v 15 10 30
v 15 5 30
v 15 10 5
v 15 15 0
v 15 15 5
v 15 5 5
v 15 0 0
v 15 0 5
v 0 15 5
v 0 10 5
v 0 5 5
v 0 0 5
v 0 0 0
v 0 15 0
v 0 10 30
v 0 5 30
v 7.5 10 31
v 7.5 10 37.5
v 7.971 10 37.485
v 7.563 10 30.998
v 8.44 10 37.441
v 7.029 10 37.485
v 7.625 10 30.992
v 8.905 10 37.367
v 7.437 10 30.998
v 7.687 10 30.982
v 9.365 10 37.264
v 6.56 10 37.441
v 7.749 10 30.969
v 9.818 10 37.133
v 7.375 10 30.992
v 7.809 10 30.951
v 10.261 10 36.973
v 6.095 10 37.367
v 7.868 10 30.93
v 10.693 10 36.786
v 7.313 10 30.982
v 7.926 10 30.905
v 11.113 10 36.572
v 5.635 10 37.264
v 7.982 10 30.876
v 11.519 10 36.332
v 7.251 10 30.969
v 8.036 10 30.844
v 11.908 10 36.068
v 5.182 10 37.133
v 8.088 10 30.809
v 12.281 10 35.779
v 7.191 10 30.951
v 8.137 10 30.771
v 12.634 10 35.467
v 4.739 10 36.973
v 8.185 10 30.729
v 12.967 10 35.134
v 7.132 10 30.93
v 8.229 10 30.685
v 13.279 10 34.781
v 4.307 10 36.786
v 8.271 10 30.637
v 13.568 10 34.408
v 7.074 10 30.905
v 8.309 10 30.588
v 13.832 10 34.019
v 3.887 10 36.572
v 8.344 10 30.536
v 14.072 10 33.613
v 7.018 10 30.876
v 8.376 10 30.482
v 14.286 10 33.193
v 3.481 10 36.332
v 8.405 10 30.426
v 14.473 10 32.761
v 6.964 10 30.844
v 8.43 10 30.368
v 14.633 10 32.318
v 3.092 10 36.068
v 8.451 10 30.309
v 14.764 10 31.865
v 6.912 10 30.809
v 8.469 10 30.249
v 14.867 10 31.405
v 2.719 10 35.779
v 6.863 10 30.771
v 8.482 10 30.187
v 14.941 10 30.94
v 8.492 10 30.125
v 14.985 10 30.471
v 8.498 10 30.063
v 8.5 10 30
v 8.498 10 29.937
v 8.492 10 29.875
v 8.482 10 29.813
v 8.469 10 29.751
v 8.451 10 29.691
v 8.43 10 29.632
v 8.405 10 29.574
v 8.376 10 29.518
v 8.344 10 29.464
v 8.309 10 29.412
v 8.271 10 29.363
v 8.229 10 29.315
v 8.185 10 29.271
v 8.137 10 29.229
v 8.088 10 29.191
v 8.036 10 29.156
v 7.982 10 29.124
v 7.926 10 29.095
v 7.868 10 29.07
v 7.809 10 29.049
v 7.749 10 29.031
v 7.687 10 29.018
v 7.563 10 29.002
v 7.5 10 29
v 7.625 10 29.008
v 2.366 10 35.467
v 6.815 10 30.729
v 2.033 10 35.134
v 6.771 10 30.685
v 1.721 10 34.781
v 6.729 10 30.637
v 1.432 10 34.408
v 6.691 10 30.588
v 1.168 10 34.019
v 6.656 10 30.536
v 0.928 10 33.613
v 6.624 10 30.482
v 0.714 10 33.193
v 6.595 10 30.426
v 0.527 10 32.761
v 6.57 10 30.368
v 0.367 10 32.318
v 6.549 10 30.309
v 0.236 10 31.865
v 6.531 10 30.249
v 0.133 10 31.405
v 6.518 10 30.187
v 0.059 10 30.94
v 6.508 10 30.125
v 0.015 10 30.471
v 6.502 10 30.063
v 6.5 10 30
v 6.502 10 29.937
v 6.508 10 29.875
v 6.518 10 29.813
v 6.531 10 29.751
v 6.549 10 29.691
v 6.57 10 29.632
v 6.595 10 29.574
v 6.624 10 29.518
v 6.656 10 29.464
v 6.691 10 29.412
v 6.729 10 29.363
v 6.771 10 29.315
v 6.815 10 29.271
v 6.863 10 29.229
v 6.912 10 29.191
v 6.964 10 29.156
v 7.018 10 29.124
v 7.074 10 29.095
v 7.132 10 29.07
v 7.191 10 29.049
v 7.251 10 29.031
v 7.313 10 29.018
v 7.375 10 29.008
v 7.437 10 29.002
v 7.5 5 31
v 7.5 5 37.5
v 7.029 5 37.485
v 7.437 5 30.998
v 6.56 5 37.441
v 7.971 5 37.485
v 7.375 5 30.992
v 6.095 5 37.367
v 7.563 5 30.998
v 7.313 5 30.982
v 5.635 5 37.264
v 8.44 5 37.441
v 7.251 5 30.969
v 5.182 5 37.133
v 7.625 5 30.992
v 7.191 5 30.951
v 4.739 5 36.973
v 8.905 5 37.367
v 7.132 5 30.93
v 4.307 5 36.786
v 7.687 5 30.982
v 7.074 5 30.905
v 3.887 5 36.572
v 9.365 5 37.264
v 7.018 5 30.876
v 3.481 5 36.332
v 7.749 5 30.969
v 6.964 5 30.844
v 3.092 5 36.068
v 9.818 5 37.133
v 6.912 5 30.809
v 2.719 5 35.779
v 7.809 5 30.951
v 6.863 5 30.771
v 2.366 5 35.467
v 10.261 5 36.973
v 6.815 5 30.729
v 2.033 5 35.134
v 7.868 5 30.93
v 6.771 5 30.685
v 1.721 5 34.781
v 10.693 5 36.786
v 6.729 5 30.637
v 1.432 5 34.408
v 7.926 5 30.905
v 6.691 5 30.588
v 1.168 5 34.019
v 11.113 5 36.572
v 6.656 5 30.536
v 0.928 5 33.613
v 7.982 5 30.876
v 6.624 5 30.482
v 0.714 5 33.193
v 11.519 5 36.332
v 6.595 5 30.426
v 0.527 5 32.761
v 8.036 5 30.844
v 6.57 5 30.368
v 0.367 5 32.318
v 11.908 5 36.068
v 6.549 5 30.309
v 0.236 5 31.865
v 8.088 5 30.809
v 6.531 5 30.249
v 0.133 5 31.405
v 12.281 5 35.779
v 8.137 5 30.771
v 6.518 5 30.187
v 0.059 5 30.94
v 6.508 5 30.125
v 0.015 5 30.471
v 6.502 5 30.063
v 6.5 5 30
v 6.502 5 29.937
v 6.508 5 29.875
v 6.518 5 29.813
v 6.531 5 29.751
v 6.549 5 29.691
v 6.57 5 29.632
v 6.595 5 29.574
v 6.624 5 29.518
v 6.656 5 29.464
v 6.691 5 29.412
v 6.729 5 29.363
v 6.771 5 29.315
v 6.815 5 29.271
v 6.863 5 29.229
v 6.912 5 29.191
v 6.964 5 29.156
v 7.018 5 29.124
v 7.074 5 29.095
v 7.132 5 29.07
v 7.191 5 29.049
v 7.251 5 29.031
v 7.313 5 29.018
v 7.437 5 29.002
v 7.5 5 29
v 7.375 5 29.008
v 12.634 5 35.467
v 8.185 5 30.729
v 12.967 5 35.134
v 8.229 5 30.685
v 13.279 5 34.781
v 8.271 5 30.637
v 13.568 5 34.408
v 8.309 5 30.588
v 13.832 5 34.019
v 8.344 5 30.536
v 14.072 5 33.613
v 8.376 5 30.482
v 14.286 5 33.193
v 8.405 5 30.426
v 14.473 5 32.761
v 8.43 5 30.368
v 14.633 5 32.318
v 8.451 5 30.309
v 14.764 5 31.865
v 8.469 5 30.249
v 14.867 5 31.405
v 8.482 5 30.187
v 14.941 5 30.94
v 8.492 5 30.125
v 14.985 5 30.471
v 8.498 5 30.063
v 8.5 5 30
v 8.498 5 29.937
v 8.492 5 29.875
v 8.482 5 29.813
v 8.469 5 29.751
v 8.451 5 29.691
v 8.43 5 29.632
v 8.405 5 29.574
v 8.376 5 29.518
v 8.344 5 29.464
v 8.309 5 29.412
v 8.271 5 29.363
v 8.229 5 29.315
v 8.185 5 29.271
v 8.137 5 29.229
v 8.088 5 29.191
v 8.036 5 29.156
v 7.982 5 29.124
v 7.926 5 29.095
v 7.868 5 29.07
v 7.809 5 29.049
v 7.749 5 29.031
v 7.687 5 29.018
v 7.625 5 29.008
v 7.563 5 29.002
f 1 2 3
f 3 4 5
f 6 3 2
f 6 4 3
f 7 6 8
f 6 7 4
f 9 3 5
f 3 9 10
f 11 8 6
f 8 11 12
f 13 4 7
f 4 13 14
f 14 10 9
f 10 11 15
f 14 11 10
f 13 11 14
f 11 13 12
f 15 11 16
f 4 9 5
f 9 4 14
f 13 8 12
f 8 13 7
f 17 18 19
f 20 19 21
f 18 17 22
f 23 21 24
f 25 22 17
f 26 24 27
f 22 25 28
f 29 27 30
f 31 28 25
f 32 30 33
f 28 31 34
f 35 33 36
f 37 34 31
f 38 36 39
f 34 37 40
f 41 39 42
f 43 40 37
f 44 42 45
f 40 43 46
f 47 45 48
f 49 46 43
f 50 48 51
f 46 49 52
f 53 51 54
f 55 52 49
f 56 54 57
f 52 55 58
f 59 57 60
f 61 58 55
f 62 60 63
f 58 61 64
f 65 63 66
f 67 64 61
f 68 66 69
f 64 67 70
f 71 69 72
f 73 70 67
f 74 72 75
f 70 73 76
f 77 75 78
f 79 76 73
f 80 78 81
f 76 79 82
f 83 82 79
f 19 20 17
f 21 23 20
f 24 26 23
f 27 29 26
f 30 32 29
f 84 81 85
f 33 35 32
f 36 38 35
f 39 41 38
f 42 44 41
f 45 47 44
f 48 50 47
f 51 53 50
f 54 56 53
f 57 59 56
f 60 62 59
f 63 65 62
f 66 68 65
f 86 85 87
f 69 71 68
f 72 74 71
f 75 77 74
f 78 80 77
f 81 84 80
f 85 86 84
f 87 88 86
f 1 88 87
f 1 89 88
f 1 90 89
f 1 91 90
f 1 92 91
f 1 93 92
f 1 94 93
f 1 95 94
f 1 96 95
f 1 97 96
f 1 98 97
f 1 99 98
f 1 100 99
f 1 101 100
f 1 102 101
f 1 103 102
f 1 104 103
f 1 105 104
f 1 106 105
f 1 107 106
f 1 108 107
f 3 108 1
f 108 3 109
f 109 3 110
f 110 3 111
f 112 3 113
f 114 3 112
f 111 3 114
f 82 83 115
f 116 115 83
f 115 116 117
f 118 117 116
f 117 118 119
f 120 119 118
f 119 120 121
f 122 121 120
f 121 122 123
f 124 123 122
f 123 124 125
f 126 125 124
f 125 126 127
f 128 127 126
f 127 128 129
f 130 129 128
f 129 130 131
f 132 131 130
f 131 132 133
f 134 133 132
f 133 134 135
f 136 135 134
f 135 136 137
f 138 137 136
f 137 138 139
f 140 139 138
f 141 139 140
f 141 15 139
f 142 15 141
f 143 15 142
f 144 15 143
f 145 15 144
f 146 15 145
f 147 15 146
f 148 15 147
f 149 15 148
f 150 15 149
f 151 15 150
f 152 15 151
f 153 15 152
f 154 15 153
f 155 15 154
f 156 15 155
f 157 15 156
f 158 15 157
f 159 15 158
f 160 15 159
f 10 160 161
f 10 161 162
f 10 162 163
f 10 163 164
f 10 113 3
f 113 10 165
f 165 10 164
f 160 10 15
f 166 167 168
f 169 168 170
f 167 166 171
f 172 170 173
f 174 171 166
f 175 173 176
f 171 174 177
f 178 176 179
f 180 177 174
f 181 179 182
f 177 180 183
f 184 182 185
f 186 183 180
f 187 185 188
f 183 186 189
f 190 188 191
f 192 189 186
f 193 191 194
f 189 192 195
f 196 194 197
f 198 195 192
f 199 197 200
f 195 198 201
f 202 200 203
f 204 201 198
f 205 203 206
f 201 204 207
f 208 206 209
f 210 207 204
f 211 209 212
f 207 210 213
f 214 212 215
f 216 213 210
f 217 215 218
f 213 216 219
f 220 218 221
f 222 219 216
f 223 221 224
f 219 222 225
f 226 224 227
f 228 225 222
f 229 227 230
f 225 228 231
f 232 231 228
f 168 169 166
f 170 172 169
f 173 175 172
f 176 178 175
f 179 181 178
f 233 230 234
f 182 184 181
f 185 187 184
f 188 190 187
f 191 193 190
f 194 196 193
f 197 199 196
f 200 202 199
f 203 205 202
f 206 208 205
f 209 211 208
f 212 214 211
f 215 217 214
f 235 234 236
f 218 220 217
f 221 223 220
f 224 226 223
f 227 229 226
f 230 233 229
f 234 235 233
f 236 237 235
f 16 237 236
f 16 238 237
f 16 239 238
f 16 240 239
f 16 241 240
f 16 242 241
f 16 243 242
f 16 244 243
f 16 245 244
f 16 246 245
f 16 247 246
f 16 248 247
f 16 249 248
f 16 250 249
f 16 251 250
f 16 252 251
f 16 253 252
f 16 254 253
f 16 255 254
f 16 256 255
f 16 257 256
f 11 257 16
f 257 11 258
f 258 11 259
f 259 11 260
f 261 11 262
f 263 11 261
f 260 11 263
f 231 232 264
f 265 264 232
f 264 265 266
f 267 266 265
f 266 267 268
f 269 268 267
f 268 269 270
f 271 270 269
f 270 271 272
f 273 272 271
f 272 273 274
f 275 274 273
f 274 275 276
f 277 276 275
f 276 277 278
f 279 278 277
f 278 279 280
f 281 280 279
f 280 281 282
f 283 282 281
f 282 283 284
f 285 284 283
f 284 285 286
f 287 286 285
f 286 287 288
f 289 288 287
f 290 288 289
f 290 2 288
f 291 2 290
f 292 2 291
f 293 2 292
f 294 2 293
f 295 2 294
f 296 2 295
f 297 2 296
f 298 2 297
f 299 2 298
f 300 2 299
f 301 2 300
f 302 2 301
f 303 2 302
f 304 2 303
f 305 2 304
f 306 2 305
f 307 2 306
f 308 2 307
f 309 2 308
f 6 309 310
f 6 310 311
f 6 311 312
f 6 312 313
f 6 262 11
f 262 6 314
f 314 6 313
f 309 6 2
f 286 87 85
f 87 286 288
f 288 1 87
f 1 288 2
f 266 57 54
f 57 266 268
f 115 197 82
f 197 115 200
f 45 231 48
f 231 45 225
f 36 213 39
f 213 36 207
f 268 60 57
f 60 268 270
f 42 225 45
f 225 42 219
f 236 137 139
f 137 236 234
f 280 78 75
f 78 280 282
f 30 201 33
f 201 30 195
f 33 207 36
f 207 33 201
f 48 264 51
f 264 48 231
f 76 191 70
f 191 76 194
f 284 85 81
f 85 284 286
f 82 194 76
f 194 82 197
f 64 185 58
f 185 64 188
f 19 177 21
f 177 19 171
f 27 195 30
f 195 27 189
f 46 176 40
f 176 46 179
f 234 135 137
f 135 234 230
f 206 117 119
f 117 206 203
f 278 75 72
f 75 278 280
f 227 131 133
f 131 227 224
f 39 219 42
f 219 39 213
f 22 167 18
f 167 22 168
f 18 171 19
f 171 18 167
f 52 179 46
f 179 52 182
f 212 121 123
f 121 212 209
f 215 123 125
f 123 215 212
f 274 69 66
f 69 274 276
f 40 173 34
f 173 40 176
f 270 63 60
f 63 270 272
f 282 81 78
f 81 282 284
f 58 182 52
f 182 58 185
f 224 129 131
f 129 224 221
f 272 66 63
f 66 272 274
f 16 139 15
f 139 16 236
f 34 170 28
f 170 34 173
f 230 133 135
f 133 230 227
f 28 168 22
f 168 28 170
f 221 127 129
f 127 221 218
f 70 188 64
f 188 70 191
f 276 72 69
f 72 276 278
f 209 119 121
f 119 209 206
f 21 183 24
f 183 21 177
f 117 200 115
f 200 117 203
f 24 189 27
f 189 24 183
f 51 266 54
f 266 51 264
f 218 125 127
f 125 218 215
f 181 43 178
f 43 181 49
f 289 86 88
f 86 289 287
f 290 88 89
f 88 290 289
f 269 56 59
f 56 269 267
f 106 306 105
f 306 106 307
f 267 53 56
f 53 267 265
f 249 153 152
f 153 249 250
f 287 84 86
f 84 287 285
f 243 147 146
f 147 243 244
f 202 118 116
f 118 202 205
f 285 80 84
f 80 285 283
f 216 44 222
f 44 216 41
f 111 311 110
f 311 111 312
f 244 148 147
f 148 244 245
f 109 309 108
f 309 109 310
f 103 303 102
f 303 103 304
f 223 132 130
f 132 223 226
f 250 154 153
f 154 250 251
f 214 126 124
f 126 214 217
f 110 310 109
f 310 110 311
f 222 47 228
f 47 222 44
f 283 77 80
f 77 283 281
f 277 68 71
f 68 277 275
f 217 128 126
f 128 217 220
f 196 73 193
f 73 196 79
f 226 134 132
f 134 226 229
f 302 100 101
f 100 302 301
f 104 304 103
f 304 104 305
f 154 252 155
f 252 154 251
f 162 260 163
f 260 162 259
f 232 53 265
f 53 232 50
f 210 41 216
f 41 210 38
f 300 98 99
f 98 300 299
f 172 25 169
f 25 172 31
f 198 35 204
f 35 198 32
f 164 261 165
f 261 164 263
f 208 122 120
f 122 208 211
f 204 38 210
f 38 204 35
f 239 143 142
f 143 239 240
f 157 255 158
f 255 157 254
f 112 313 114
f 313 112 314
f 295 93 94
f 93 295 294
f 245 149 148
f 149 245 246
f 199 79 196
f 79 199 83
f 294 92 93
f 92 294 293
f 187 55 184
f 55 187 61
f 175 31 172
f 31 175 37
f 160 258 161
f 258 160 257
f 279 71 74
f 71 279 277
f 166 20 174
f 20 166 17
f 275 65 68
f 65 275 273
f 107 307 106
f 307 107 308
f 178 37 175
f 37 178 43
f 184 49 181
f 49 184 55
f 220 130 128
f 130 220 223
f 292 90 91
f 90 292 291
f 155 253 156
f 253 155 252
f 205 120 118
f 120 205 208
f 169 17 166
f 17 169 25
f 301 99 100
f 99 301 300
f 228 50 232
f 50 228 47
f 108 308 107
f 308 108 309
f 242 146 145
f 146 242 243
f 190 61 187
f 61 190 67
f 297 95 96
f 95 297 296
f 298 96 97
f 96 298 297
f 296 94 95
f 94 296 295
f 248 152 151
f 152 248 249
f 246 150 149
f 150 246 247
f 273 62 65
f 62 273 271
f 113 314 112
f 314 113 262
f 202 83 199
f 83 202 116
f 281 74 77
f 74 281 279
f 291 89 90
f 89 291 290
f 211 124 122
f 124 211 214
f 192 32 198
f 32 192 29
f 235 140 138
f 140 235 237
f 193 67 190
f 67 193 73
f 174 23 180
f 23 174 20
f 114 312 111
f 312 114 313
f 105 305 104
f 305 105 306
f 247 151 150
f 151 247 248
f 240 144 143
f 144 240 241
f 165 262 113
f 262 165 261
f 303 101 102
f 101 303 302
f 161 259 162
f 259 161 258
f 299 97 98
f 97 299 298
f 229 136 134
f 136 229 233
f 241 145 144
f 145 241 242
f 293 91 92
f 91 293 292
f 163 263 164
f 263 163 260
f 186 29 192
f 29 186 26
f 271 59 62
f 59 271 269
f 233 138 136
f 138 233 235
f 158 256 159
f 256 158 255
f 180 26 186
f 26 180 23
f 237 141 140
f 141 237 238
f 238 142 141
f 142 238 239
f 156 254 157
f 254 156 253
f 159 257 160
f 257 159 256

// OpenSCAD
difference(){
	union(){ 

        translate([0,0,0]){
           cube([15,15,5], center=false);
        }
        translate([0,5,0]){
           cube([15,5,30], center=false);
        }
        translate([7.5,10,30]){
            rotate([90,0,0]){
                cylinder(h=5, r=7.5, $fn=100, center=false);
            }
        }
	}
	union() {
        translate([7.5,15,30]){
            rotate([90,0,0]){
                cylinder(h=20, r=1, $fn=100, center=false);
            }
        }

	}
}
